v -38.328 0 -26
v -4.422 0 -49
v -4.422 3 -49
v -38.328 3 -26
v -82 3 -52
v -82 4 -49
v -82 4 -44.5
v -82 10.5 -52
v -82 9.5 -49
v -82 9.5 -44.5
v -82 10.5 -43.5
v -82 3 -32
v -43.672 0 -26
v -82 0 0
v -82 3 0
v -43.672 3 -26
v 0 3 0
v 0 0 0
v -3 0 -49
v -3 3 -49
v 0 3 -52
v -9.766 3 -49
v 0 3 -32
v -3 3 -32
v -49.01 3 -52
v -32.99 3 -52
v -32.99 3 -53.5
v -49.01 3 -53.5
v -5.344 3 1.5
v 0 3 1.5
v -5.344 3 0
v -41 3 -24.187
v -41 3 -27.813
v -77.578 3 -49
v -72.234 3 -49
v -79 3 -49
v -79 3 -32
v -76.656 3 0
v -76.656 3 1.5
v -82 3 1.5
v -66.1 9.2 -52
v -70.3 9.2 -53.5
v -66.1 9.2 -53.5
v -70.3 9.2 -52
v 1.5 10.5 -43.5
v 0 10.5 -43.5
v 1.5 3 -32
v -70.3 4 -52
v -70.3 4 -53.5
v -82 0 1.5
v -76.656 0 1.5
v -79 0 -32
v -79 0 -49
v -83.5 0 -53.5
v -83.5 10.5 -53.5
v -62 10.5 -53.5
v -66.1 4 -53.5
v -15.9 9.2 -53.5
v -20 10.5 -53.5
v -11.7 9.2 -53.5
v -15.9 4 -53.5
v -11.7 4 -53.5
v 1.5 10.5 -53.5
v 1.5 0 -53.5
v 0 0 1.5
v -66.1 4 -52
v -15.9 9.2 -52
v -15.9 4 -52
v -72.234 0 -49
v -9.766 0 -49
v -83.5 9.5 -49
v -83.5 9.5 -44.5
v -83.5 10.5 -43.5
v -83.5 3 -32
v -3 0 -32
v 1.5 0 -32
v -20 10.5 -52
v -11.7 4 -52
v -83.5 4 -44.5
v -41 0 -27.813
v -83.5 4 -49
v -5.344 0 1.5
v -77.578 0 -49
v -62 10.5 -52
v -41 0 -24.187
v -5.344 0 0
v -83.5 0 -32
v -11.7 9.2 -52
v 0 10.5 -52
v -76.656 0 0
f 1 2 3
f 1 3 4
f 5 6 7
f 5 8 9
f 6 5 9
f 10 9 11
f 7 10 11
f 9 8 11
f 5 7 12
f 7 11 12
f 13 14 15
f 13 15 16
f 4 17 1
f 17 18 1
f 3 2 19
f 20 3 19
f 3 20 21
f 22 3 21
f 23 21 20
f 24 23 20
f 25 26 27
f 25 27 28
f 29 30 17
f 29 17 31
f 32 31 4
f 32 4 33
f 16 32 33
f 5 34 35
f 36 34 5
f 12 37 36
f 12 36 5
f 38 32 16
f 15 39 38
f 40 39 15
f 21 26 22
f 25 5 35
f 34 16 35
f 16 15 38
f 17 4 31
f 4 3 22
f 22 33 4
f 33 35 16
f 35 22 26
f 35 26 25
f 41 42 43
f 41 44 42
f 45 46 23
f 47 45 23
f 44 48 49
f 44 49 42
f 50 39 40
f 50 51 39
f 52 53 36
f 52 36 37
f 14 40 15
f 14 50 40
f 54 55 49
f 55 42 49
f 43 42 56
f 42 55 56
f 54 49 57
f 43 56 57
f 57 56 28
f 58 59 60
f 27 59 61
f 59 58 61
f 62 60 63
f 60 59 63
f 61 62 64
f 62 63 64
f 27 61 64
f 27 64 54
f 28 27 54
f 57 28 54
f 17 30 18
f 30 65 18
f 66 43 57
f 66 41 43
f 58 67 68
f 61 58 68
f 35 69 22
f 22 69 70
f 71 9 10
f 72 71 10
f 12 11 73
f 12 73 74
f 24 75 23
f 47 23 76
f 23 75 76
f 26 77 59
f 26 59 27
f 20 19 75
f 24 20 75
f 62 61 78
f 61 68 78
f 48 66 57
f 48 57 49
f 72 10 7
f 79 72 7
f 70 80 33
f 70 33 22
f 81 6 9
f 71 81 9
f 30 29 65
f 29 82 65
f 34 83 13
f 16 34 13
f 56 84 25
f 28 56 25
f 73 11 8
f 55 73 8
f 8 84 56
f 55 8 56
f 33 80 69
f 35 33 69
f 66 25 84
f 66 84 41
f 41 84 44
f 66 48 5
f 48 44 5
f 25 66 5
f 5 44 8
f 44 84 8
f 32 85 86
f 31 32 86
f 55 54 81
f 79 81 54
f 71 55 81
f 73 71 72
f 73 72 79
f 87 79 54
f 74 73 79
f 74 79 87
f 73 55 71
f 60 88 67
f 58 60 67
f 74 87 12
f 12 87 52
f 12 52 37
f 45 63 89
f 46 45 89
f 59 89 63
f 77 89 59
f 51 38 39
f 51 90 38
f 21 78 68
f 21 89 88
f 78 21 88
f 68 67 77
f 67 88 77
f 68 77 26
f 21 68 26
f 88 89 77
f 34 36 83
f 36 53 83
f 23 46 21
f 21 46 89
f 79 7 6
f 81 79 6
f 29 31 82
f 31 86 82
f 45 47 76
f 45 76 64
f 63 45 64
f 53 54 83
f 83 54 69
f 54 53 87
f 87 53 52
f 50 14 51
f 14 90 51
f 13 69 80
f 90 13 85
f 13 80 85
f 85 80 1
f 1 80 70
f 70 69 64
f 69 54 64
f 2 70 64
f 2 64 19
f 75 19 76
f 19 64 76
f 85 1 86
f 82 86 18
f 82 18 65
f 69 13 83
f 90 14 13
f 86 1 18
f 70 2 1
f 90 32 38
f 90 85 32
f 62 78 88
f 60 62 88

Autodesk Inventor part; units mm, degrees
ref_plane "YZ Plane" through (0, 0, 0) normal (1, 0, 0) x (0, 1, 0)
ref_plane "XZ Plane" through (0, 0, 0) normal (0, 1, 0) x (-1, 0, 0)
ref_plane "XY Plane" through (0, 0, 0) normal (0, 0, 1) x (1, 0, 0)
sketch "Sketch1" plane through (0, 0, 0) normal (0, 1, 0) x (-1, 0, 0)
  line L0 (82, 0) -> (82, -52)
  line L1 (82, -52) -> (0, -52)
  line L2 (0, -52) -> (0, 0)
  line L3 (82, 0) -> (0, 0)
  line L4 (0, 0) -> (76.656, -52)
  line L5 (82, -52) -> (5.344, 0)
  line L6 (82, -26) -> (0, -26) construction
  line L7 (0, -52) -> (76.656, 0)
  line L8 (82, 0) -> (5.344, -52)
  line L9 (41, -52) -> (41, 0) construction
  line L10 (82, -49) -> (0, -49)
  line L11 (3, -52) -> (3, -32)
  line L12 (3, -32) -> (0, -32)
  line L13 (79, -52) -> (79, -32)
  line L14 (79, -32) -> (82, -32)
  line L15 (76.656, 0) -> (76.656, 1.5)
  line L16 (76.656, 1.5) -> (82, 1.5)
  line L17 (82, 1.5) -> (82, 0)
  line L18 (5.344, 0) -> (5.344, 1.5)
  line L19 (5.344, 1.5) -> (0, 1.5)
  line L20 (0, 1.5) -> (0, 0)
  point P0 (43.672, -26)
  point P1 (41, -24.1874)
  point P2 (38.328, -26)
  point P3 (4.4225, -49)
  point P4 (0, -49)
  point P5 (77.5775, -49)
  point P6 (41, -27.8126)
  point P7 (72.2336, -49)
  point P8 (9.7664, -49)
  point P9 (79, -49)
  point P10 (3, -49)
  dimension "d5" = 82
  dimension "d6" = 52
  dimension "d7" = 3
  dimension "d9" = 3
  dimension "d12" = 20
  dimension "d13" = 3
  dimension "d14" = 20
  dimension "d15" = 3
  dimension "d35" = 1.5
extrude "Extrusion1" add sketch "Sketch1" along normal blind 3 contours L8 L5 L7 L3 | L3 L15 L16 L17 | L0 L10 L13 L14 | L8 L4 L7 L5 | L5 L10 L4 L8 | L0 L5 L13 L10 | L5 L7 L4 L3 | L3 L20 L19 L18 | L10 L13 L5 | L5 L13 L1 L4 L10 | L8 L10 L7 L4 | L1 L13 L5 | L4 L1 L8 L10 | L8 L1 L11 L7 L10 | L12 L11 L10 L2 | L7 L11 L10 | L10 L11 L7 L2 | L11 L1 L7
sketch "Sketch2" plane through (0, 0, -52) normal (0, 0, -1) x (-1, 0, 0)
  line L0 (0, 3) -> (38.328, 3) projected
  line L1 (82, 0) -> (76.656, 0) projected
  line L2 (0, 3) -> (82, 3)
  line L3 (82, 3) -> (82, 0)
  line L4 (82, 0) -> (0, 0)
  line L5 (0, 0) -> (0, 3)
  line L6 (0, 3) -> (0, 10.5)
  line L7 (0, 10.5) -> (20, 10.5)
  line L8 (20, 10.5) -> (32.9904, 3)
  line L9 (11.7, 9.2) -> (15.9, 9.2)
  line L10 (15.9, 9.2) -> (15.9, 4)
  line L11 (15.9, 4) -> (11.7, 4)
  line L12 (11.7, 4) -> (11.7, 9.2)
  line L13 (41, 0) -> (41, 19.2831) construction
  line L14 (32.9904, 3) -> (41, 3) construction
  line L15 (82, 3) -> (43.672, 3)
  line L16 (82, 3) -> (0, 3)
  line L17 (82, 0) -> (82, 3)
  line L18 (82, 3) -> (82, 10.5)
  line L19 (82, 10.5) -> (62, 10.5)
  line L20 (62, 10.5) -> (49.0096, 3)
  line L21 (70.3, 9.2) -> (66.1, 9.2)
  line L22 (66.1, 9.2) -> (66.1, 4)
  line L23 (66.1, 4) -> (70.3, 4)
  line L24 (70.3, 4) -> (70.3, 9.2)
  line L25 (49.0096, 3) -> (41, 3) construction
  point P0 (11.7, 6.6)
  point P1 (13.8, 4)
  point P2 (13.8, 9.2)
  point P3 (70.3, 6.6)
  point P4 (68.2, 4)
  point P5 (68.2, 9.2)
  point P6 (38.328, 3)
  dimension "d16" = 20
  dimension "d17" = 7.5
  dimension "d18" = 15
  dimension "d19" = 11.7
  dimension "d20" = 4.2
  dimension "d21" = 5.2
  dimension "d22" = 4
extrude "Extrusion2" add sketch "Sketch2" along normal blind 1.5
sketch "Sketch3" plane through (0, 0, -32) normal (1, 0, 0) x (0, 0, -1)
  line L0 (21.5, 0) -> (21.5, 10.5) projected
  line L1 (21.5, 10.5) -> (11.5, 10.5)
  line L2 (0, 0) -> (21.5, 0) projected
  line L3 (0, 0) -> (0, 3) projected
  line L4 (21.5, 0) -> (0, 0)
  line L5 (0, 0) -> (0, 3)
  line L6 (0, 3) -> (21.5, 3)
  line L7 (21.5, 3) -> (21.5, 0)
  line L8 (11.5, 10.5) -> (0, 3)
  point P0 (-32, 0)
  dimension "d25" = 10
extrude "Extrusion3" add sketch "Sketch3" along normal blind 1.5
sketch "Sketch4" plane through (-82, 0, -32) normal (-1, 0, 0) x (0, 0, 1)
  line L0 (-11.5, 10.5) -> (0, 3) projected
  line L1 (0, 3) -> (-11.5, 10.5)
  line L2 (-20, 10.5) -> (-21.5, 10.5) projected
  line L3 (-11.5, 10.5) -> (-21.5, 10.5)
  line L4 (-21.5, 10.5) -> (-21.5, 0)
  line L5 (-21.5, 0) -> (0, 0)
  line L6 (0, 0) -> (0, 3)
  line L7 (-17, 9.5) -> (-12.5, 9.5)
  line L8 (-12.5, 9.5) -> (-12.5, 4)
  line L9 (-12.5, 4) -> (-17, 4)
  line L10 (-17, 4) -> (-17, 9.5)
  point P0 (32, 0)
  point P1 (-21.5, 5.25)
  point P2 (-20, 10.5)
  dimension "d28" = 4.5
  dimension "d29" = 4.5
  dimension "d30" = 4
  dimension "d31" = 5.5
  dimension "d32" = 1
extrude "Extrusion4" add sketch "Sketch4" along normal blind 1.5
